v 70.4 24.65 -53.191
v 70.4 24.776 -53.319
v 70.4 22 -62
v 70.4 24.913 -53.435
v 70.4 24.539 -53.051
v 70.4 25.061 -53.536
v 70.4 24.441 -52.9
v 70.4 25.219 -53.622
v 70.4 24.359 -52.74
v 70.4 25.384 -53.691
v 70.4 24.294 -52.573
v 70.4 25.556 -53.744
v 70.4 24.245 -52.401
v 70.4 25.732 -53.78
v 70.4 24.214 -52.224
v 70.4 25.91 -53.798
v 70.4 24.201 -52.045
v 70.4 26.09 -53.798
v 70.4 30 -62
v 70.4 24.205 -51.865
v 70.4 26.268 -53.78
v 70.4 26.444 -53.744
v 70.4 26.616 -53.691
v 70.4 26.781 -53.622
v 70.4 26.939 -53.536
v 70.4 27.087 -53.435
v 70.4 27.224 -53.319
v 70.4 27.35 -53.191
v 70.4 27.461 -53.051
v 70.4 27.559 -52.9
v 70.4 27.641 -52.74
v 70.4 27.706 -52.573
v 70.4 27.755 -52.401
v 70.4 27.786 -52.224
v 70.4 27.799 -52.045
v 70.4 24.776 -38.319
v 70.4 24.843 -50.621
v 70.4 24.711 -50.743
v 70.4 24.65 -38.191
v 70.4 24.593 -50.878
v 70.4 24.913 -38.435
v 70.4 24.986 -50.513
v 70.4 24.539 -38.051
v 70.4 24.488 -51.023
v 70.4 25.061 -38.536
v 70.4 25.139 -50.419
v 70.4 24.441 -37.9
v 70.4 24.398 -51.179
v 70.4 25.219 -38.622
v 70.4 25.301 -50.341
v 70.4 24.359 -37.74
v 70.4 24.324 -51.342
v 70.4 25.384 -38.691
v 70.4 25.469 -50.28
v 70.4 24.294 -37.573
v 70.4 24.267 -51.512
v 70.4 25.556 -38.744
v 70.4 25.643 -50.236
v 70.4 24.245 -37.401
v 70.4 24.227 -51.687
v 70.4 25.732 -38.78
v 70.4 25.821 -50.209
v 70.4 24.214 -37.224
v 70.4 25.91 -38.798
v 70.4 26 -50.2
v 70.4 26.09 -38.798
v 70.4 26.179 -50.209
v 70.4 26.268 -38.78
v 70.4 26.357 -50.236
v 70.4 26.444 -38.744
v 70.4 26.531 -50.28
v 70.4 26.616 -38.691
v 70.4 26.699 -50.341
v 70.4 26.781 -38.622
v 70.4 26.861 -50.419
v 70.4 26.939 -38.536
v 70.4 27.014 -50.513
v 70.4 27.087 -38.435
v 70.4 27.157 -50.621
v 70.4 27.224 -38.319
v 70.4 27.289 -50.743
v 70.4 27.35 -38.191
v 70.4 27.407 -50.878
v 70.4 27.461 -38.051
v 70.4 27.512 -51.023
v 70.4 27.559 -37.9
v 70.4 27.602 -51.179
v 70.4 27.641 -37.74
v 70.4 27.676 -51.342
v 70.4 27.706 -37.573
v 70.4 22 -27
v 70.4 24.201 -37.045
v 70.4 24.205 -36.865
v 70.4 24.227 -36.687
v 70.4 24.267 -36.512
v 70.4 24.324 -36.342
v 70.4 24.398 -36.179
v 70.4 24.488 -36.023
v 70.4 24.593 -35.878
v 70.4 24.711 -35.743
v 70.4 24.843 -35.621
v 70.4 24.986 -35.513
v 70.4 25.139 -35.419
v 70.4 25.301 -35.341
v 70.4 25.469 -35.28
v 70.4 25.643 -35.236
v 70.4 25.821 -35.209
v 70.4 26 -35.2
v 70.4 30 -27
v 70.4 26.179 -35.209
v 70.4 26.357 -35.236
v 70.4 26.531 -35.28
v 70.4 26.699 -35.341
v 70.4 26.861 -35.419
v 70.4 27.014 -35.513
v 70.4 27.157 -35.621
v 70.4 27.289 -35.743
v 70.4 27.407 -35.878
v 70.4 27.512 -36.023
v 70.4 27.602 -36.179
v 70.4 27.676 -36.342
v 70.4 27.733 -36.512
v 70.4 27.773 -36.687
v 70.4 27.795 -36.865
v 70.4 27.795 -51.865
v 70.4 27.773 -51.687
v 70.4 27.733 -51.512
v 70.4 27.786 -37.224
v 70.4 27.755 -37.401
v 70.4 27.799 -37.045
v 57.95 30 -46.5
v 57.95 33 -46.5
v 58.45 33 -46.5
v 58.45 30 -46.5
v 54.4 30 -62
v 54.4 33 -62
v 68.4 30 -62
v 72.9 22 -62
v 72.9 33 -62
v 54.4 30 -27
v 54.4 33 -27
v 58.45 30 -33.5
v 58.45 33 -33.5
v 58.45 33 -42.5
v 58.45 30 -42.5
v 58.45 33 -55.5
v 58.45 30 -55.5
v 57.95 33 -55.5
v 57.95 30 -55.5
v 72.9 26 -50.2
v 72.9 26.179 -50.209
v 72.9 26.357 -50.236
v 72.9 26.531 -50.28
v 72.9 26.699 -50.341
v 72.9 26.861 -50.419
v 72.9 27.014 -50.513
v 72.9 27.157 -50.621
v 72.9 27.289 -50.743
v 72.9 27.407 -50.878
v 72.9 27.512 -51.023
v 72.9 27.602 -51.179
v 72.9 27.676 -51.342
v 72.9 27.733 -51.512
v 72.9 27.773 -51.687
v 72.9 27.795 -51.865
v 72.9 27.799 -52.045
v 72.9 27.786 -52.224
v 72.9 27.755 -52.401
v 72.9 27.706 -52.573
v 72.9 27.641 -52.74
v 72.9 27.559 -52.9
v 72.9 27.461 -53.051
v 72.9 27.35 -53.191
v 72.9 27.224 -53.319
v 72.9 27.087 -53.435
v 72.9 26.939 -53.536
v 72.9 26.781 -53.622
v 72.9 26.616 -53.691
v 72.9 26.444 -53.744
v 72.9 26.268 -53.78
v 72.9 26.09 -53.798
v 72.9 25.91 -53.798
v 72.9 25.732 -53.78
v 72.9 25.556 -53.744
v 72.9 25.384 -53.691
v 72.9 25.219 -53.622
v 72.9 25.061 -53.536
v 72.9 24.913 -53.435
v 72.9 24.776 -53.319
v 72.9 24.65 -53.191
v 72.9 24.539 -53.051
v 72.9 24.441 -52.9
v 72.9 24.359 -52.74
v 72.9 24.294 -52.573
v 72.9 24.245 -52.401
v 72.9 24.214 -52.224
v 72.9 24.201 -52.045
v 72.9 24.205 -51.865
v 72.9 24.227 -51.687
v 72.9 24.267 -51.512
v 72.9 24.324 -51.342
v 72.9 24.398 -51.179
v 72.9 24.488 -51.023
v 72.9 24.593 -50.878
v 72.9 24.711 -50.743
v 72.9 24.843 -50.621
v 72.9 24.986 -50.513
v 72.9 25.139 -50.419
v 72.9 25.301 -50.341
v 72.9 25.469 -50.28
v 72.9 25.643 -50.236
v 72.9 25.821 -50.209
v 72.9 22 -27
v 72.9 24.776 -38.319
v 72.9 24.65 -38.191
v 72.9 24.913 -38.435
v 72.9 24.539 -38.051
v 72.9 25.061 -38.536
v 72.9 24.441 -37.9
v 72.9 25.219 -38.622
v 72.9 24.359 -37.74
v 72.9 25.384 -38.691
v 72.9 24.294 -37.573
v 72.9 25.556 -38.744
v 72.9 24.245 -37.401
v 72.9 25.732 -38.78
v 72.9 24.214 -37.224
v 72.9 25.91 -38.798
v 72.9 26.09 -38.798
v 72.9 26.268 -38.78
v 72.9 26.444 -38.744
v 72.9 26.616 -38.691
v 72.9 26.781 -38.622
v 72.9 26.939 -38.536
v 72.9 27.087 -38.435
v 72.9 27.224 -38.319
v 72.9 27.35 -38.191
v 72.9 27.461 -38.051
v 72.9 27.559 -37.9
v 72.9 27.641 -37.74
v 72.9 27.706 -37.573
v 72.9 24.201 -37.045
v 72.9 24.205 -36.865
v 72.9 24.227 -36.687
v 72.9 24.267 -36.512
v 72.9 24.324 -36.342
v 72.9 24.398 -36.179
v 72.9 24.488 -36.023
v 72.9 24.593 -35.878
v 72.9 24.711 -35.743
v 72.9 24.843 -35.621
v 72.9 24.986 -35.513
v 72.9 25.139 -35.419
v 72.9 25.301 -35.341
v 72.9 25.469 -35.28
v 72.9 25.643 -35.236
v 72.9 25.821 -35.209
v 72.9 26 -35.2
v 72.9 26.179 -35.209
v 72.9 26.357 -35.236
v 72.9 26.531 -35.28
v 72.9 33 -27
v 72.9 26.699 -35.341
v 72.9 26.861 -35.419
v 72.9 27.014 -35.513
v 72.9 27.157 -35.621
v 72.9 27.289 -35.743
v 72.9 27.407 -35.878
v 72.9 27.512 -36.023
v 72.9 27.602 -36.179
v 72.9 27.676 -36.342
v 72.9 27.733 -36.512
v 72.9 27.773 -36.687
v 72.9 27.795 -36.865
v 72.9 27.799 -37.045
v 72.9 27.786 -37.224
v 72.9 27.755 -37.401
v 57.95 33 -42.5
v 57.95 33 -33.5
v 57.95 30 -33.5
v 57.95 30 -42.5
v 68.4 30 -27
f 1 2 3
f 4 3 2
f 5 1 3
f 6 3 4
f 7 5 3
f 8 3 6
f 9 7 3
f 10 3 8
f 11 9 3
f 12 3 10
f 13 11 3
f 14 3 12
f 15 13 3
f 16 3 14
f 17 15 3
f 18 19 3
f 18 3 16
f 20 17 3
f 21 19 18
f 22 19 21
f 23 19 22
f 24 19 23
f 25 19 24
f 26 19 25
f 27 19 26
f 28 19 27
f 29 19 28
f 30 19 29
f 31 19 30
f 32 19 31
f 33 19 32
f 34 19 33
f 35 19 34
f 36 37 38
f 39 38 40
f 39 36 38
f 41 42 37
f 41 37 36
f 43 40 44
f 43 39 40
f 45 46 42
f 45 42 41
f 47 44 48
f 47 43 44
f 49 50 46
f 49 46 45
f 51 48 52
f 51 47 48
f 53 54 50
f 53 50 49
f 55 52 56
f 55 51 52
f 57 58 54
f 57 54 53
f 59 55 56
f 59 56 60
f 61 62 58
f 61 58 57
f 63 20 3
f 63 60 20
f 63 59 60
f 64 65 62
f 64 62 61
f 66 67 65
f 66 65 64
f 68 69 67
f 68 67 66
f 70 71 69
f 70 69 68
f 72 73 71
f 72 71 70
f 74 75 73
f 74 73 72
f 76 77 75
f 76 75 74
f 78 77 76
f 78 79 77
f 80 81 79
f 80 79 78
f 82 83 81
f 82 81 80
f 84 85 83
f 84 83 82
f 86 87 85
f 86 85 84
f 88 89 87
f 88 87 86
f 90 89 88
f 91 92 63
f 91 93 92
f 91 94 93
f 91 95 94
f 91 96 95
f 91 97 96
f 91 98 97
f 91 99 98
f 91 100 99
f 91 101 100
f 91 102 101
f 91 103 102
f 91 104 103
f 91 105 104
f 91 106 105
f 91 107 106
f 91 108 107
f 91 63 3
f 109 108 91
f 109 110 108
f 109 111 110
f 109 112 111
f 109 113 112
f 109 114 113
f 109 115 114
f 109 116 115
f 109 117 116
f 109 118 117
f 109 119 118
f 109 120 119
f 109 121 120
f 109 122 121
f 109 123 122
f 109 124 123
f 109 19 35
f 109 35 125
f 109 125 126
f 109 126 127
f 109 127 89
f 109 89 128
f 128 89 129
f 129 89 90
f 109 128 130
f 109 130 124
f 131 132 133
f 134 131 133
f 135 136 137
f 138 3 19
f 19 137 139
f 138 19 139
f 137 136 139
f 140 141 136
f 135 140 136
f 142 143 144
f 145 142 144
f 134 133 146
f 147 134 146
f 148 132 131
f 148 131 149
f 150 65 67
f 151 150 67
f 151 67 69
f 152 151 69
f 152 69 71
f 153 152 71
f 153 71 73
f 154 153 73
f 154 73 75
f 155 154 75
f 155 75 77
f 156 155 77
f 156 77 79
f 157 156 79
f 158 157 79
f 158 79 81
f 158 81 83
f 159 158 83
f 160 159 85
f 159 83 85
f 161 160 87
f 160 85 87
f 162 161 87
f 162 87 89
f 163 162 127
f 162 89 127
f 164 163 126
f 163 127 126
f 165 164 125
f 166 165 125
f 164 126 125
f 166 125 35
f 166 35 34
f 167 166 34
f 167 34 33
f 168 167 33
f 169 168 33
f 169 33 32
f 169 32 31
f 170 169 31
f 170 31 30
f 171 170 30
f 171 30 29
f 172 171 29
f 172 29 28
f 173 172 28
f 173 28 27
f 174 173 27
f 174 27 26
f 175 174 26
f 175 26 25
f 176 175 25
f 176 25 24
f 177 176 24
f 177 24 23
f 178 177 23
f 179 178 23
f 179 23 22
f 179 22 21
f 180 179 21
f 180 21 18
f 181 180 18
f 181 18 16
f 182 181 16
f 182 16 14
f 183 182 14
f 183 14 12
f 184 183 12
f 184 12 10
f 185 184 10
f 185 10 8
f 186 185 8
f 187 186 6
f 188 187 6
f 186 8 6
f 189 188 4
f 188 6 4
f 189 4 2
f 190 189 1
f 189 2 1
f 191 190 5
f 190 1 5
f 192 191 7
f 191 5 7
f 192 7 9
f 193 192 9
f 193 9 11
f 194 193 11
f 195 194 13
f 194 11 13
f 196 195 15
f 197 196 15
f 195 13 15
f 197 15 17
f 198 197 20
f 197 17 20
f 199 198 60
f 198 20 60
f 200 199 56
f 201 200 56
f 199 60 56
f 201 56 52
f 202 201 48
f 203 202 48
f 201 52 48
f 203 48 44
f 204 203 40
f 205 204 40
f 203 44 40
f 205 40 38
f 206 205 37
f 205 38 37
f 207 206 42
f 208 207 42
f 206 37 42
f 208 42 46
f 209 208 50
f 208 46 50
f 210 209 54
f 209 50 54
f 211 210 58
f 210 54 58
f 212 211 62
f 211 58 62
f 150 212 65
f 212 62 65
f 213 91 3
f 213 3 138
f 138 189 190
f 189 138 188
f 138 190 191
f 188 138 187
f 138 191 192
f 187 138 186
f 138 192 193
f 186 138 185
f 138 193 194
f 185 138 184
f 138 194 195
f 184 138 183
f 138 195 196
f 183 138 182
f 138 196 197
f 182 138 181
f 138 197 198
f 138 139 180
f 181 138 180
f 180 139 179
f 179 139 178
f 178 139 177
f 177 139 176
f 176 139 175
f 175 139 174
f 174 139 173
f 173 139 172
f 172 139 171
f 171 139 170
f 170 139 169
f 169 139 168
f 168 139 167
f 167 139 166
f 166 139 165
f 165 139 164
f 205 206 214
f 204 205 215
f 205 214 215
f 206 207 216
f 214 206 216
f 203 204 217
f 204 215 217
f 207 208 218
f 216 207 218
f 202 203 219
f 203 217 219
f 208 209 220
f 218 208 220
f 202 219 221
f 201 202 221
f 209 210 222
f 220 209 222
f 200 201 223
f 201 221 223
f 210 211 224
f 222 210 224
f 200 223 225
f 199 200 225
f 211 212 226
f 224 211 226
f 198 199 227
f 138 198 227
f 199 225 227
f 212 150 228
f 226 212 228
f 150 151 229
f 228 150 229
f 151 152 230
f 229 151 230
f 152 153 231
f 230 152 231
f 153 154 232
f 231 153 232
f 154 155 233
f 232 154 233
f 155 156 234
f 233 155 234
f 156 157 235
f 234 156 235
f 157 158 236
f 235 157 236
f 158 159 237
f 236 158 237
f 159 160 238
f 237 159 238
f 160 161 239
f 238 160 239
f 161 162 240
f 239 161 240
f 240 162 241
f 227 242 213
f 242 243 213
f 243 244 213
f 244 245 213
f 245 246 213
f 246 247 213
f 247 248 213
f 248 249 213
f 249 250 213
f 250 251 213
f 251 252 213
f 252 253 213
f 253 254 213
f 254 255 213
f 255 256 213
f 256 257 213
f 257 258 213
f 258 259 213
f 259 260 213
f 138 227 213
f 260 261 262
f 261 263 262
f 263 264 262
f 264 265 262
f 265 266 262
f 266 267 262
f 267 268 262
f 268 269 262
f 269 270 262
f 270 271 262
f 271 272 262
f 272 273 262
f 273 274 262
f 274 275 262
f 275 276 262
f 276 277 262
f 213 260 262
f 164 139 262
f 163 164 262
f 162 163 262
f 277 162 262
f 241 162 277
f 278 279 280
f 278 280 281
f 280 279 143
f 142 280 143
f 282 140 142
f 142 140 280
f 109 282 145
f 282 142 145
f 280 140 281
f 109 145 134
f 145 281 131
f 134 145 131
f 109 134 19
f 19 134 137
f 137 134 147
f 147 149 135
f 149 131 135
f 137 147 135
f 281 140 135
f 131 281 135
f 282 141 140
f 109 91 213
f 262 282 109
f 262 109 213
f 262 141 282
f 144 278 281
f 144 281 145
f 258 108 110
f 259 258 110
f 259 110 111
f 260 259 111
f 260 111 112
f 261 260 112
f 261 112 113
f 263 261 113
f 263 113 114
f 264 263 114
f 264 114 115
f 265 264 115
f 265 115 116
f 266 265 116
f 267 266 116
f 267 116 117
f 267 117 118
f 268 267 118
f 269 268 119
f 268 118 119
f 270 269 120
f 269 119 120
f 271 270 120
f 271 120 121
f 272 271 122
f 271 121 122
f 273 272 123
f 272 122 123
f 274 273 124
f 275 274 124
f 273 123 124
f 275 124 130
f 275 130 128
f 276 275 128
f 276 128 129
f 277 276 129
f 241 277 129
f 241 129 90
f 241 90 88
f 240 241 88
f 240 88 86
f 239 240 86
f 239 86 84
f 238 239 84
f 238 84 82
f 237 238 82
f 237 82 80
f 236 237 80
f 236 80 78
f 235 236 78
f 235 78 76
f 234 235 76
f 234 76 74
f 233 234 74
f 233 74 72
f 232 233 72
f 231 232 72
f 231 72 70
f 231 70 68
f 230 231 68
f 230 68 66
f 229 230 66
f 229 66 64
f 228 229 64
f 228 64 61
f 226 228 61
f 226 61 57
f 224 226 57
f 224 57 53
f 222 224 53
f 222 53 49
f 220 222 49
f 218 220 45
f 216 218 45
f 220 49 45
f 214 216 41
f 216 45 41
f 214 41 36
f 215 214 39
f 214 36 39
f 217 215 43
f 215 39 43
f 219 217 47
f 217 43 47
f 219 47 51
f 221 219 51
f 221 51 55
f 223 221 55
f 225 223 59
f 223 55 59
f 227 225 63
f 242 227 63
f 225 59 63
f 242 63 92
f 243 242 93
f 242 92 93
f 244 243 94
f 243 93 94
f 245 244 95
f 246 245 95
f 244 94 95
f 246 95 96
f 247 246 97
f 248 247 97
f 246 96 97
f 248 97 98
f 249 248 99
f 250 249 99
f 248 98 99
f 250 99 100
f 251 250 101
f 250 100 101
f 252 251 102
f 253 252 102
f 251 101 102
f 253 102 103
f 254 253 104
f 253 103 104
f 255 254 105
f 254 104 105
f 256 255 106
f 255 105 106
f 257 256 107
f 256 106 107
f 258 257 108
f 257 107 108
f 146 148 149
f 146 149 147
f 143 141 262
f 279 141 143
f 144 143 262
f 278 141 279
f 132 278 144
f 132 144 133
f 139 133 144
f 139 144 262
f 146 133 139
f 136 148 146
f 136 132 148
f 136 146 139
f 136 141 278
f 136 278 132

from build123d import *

# Parameters (mm, degrees)
SKETCH1_W               = 70.4
SKETCH1_H               = 2
BOSS_EXTRUDE2_DEPTH     = 10
SKETCH2_W               = 2
SKETCH2_H               = 55
BOSS_EXTRUDE3_DEPTH     = 10
SKETCH3_W               = 19
SKETCH3_H               = 3
BOSS_EXTRUDE4_DEPTH     = 2
SKETCH4_W               = 15
SKETCH4_H               = 10
CUT_EXTRUDE2_DEPTH      = 2
SKETCH5_W               = 2
SKETCH5_H               = 3
BOSS_EXTRUDE5_DEPTH     = 1
SKETCH6_W               = 2
SKETCH6_H               = 3
BOSS_EXTRUDE6_DEPTH     = 1
SKETCH7_W               = 57
SKETCH7_H               = 2
BOSS_EXTRUDE7_DEPTH     = 6.6
SKETCH8_W               = 57
SKETCH8_H               = 2
BOSS_EXTRUDE8_DEPTH     = 6.6
BOSS_EXTRUDE9_DEPTH     = 5
SKETCH12_W              = 2
SKETCH12_H              = 5
SKETCH12_H_2            = 40
SKETCH12_H_3            = 30
BOSS_EXTRUDE10_DEPTH    = 20
BOSS_EXTRUDE11_DEPTH    = 3
SKETCH14_W              = 0.5
SKETCH14_H              = 9
CUT_EXTRUDE3_DEPTH      = 3
SKETCH15_W              = 38.4
SKETCH15_H              = 45
CUT_EXTRUDE4_DEPTH      = 3
BOSS_EXTRUDE12_DEPTH    = 0.5
SKETCH17_R              = 1.8
SKETCH17_W              = 3
SKETCH17_H              = 5
CUT_EXTRUDE6_DEPTH      = 3
CUT_EXTRUDE7_DEPTH      = 71
CUT_EXTRUDE7_DEPTH_BACK = 51
SKETCH18_W              = 76.208755975
SKETCH18_H              = 59.797515132
CUT_EXTRUDE8_DEPTH      = 87
CUT_EXTRUDE8_DEPTH_BACK = 25
SKETCH19_W              = 80.230135701
SKETCH19_H              = 33.851054281
SKETCH20_W              = 35
SKETCH20_H              = 3
BOSS_EXTRUDE13_DEPTH    = 2.5
SKETCH21_W              = 2.5
SKETCH21_H              = 35
BOSS_EXTRUDE14_DEPTH    = 8
SKETCH22_R              = 1.8
CUT_EXTRUDE10_DEPTH     = 10


with BuildPart() as part:
    # Sketch1 → Boss-Extrude2 (new body)
    with BuildSketch(Plane(origin=(0, 0, 0), x_dir=(1, 0, 0), z_dir=(0, 1, 0))):
        with Locations((35.2, 1)):
            Rectangle(SKETCH1_W, SKETCH1_H)
    extrude(amount=BOSS_EXTRUDE2_DEPTH)

    # Sketch2 → Boss-Extrude3 (add)
    with BuildSketch(Plane(origin=(0, 10, 0), x_dir=(1, 0, 0), z_dir=(0, 1, 0))):
        with Locations((1, 29.5)):
            Rectangle(SKETCH2_W, SKETCH2_H)
        with Locations((69.4, 29.5)):
            Rectangle(SKETCH2_W, SKETCH2_H)
    extrude(amount=-BOSS_EXTRUDE3_DEPTH)

    # Sketch3 → Boss-Extrude4 (add)
    with BuildSketch(Plane.XY):
        with Locations((35.2, 11.5)):
            Rectangle(SKETCH3_W, SKETCH3_H)
    extrude(amount=-BOSS_EXTRUDE4_DEPTH)

    # Sketch4 → Cut-Extrude2 (cut)
    with BuildSketch(Plane.XY):
        with Locations((35.2, 5)):
            Rectangle(SKETCH4_W, SKETCH4_H)
    extrude(amount=-CUT_EXTRUDE2_DEPTH, mode=Mode.SUBTRACT)

    # Sketch5 → Boss-Extrude5 (add)
    with BuildSketch(Plane.ZY.offset(-25.7)):
        with Locations((-1, 11.5)):
            Rectangle(SKETCH5_W, SKETCH5_H)
    extrude(amount=BOSS_EXTRUDE5_DEPTH)

    # Sketch6 → Boss-Extrude6 (add)
    with BuildSketch(Plane(origin=(44.7, 0, 0), x_dir=(0, 0, -1), z_dir=(1, 0, 0))):
        with Locations((1, 11.5)):
            Rectangle(SKETCH6_W, SKETCH6_H)
    extrude(amount=BOSS_EXTRUDE6_DEPTH)

    # Sketch7 → Boss-Extrude7 (add)
    with BuildSketch(Plane.ZY):
        with Locations((-28.5, 1)):
            Rectangle(SKETCH7_W, SKETCH7_H)
    extrude(amount=BOSS_EXTRUDE7_DEPTH)

    # Sketch8 → Boss-Extrude8 (add)
    with BuildSketch(Plane(origin=(70.4, 0, 0), x_dir=(0, 0, -1), z_dir=(1, 0, 0))):
        with Locations((28.5, 1)):
            Rectangle(SKETCH8_W, SKETCH8_H)
    extrude(amount=BOSS_EXTRUDE8_DEPTH)

    # Sketch10 → Boss-Extrude9 (add)
    with BuildSketch(Plane(origin=(0, 0, -57), x_dir=(-1, 0, 0), z_dir=(0, 0, -1))):
        Polygon((-2, 10), (-2, 0), (6.6, 0), (6.6, 2), (0, 2), (0, 10), align=None)
        Polygon((-77, 0), (-68.4, 0), (-68.4, 10), (-70.4, 10), (-70.4, 2), (-77, 2), align=None)
    extrude(amount=BOSS_EXTRUDE9_DEPTH)

    # Sketch12 → Boss-Extrude10 (add)
    with BuildSketch(Plane(origin=(0, 10, 0), x_dir=(1, 0, 0), z_dir=(0, 1, 0))):
        with Locations((1, 59.5)):
            Rectangle(SKETCH12_W, SKETCH12_H)
        with Locations((1, 37)):
            Rectangle(SKETCH12_W, SKETCH12_H_2)
        with Locations((69.4, 42)):
            Rectangle(SKETCH12_W, SKETCH12_H_3)
        with Locations((69.4, 59.5)):
            Rectangle(SKETCH12_W, SKETCH12_H)
    extrude(amount=BOSS_EXTRUDE10_DEPTH)

    # Sketch13 → Boss-Extrude11 (add)
    with BuildSketch(Plane(origin=(0, 30, 0), x_dir=(1, 0, 0), z_dir=(0, 1, 0))):
        Polygon((0, 17), (35.2, 17), (35.2, 27), (70.4, 27), (70.4, 62), (0, 62), align=None)
    extrude(amount=BOSS_EXTRUDE11_DEPTH)

    # Sketch14 → Cut-Extrude3 (cut)
    with BuildSketch(Plane(origin=(0, 33, 0), x_dir=(1, 0, 0), z_dir=(0, 1, 0))):
        with Locations((11.7, 51)):
            Rectangle(SKETCH14_W, SKETCH14_H)
        with Locations((11.7, 38)):
            Rectangle(SKETCH14_W, SKETCH14_H)
        with Locations((11.7, 25.5)):
            Rectangle(SKETCH14_W, SKETCH14_H)
        with Locations((58.2, 51)):
            Rectangle(SKETCH14_W, SKETCH14_H)
        with Locations((58.2, 38)):
            Rectangle(SKETCH14_W, SKETCH14_H)
    extrude(amount=-CUT_EXTRUDE3_DEPTH, mode=Mode.SUBTRACT)

    # Sketch15 → Cut-Extrude4 (cut)
    with BuildSketch(Plane(origin=(0, 33, 0), x_dir=(1, 0, 0), z_dir=(0, 1, 0))):
        with Locations((35.2, 39.5)):
            Rectangle(SKETCH15_W, SKETCH15_H)
    extrude(amount=-CUT_EXTRUDE4_DEPTH, mode=Mode.SUBTRACT)

    # Sketch16 → Boss-Extrude12 (add)
    with BuildSketch(Plane.XY):
        Polygon((-6.6, 0), (27.7, 0), (27.7, 10), (42.7, 10), (42.7, 0), (77, 0), (77, 2), (70.4, 2), (70.4, 10), (45.7, 10), (45.7, 13), (24.7, 13), (24.7, 10), (0, 10), (0, 2), (-6.6, 2), align=None)
    extrude(amount=BOSS_EXTRUDE12_DEPTH)

    # Sketch17 → Cut-Extrude6 (cut)
    with BuildSketch(Plane(origin=(0, 2, 0), x_dir=(1, 0, 0), z_dir=(0, 1, 0))):
        with Locations(Location((-3.3, 55, 0), (0, 0, 270))):
            Circle(SKETCH17_R)
        with Locations(Location((73.7, 55, 0), (0, 0, 270))):
            Circle(SKETCH17_R)
        with Locations(Location((-3.3, 6.5, 0), (0, 0, 270))):
            Circle(SKETCH17_R)
        with Locations(Location((73.7, 6.5, 0), (0, 0, 270))):
            Circle(SKETCH17_R)
        with Locations(Location((-3.3, 30.75, 0), (0, 0, 270))):
            Circle(SKETCH17_R)
        with Locations(Location((73.7, 30.75, 0), (0, 0, 270))):
            Circle(SKETCH17_R)
        with Locations((-3.3, 14.5)):
            Rectangle(SKETCH17_W, SKETCH17_H)
        with Locations((73.7, 14.5)):
            Rectangle(SKETCH17_W, SKETCH17_H)
    extrude(amount=-CUT_EXTRUDE6_DEPTH, mode=Mode.SUBTRACT)

    # Sketch18 → Cut-Extrude7 (cut, two sides: drawn at the far end of the back side and taken through both)
    with BuildSketch(Plane.ZY.offset(-CUT_EXTRUDE7_DEPTH_BACK)):
        with Locations((-23.895622013, 3.101242434)):
            Rectangle(SKETCH18_W, SKETCH18_H)
    extrude(amount=CUT_EXTRUDE7_DEPTH + CUT_EXTRUDE7_DEPTH_BACK, mode=Mode.SUBTRACT)

    # Sketch19 → Cut-Extrude8 (cut, two sides: drawn at the far end of the back side and taken through both)
    with BuildSketch(Plane.ZY.offset(-68.4).offset(-CUT_EXTRUDE8_DEPTH_BACK)):
        with Locations((-21.88493215, 13.07447286)):
            Rectangle(SKETCH19_W, SKETCH19_H)
    extrude(amount=CUT_EXTRUDE8_DEPTH + CUT_EXTRUDE8_DEPTH_BACK, mode=Mode.SUBTRACT)

    # Sketch20 → Boss-Extrude13 (add)
    with BuildSketch(Plane(origin=(70.4, 0, 0), x_dir=(0, 0, -1), z_dir=(1, 0, 0))):
        with Locations((44.5, 31.5)):
            Rectangle(SKETCH20_W, SKETCH20_H)
    extrude(amount=BOSS_EXTRUDE13_DEPTH)

    # Sketch21 → Boss-Extrude14 (add)
    with BuildSketch(Plane.XZ.offset(-30)):
        with Locations((71.65, -44.5)):
            Rectangle(SKETCH21_W, SKETCH21_H)
    extrude(amount=BOSS_EXTRUDE14_DEPTH)

    # Sketch22 → Cut-Extrude10 (cut)
    with BuildSketch(Plane.ZY.offset(-70.4)):
        with Locations((-52, 26)):
            Circle(SKETCH22_R)
        with Locations((-37, 26)):
            Circle(SKETCH22_R)
    extrude(amount=-CUT_EXTRUDE10_DEPTH, mode=Mode.SUBTRACT)


solid = part.part
